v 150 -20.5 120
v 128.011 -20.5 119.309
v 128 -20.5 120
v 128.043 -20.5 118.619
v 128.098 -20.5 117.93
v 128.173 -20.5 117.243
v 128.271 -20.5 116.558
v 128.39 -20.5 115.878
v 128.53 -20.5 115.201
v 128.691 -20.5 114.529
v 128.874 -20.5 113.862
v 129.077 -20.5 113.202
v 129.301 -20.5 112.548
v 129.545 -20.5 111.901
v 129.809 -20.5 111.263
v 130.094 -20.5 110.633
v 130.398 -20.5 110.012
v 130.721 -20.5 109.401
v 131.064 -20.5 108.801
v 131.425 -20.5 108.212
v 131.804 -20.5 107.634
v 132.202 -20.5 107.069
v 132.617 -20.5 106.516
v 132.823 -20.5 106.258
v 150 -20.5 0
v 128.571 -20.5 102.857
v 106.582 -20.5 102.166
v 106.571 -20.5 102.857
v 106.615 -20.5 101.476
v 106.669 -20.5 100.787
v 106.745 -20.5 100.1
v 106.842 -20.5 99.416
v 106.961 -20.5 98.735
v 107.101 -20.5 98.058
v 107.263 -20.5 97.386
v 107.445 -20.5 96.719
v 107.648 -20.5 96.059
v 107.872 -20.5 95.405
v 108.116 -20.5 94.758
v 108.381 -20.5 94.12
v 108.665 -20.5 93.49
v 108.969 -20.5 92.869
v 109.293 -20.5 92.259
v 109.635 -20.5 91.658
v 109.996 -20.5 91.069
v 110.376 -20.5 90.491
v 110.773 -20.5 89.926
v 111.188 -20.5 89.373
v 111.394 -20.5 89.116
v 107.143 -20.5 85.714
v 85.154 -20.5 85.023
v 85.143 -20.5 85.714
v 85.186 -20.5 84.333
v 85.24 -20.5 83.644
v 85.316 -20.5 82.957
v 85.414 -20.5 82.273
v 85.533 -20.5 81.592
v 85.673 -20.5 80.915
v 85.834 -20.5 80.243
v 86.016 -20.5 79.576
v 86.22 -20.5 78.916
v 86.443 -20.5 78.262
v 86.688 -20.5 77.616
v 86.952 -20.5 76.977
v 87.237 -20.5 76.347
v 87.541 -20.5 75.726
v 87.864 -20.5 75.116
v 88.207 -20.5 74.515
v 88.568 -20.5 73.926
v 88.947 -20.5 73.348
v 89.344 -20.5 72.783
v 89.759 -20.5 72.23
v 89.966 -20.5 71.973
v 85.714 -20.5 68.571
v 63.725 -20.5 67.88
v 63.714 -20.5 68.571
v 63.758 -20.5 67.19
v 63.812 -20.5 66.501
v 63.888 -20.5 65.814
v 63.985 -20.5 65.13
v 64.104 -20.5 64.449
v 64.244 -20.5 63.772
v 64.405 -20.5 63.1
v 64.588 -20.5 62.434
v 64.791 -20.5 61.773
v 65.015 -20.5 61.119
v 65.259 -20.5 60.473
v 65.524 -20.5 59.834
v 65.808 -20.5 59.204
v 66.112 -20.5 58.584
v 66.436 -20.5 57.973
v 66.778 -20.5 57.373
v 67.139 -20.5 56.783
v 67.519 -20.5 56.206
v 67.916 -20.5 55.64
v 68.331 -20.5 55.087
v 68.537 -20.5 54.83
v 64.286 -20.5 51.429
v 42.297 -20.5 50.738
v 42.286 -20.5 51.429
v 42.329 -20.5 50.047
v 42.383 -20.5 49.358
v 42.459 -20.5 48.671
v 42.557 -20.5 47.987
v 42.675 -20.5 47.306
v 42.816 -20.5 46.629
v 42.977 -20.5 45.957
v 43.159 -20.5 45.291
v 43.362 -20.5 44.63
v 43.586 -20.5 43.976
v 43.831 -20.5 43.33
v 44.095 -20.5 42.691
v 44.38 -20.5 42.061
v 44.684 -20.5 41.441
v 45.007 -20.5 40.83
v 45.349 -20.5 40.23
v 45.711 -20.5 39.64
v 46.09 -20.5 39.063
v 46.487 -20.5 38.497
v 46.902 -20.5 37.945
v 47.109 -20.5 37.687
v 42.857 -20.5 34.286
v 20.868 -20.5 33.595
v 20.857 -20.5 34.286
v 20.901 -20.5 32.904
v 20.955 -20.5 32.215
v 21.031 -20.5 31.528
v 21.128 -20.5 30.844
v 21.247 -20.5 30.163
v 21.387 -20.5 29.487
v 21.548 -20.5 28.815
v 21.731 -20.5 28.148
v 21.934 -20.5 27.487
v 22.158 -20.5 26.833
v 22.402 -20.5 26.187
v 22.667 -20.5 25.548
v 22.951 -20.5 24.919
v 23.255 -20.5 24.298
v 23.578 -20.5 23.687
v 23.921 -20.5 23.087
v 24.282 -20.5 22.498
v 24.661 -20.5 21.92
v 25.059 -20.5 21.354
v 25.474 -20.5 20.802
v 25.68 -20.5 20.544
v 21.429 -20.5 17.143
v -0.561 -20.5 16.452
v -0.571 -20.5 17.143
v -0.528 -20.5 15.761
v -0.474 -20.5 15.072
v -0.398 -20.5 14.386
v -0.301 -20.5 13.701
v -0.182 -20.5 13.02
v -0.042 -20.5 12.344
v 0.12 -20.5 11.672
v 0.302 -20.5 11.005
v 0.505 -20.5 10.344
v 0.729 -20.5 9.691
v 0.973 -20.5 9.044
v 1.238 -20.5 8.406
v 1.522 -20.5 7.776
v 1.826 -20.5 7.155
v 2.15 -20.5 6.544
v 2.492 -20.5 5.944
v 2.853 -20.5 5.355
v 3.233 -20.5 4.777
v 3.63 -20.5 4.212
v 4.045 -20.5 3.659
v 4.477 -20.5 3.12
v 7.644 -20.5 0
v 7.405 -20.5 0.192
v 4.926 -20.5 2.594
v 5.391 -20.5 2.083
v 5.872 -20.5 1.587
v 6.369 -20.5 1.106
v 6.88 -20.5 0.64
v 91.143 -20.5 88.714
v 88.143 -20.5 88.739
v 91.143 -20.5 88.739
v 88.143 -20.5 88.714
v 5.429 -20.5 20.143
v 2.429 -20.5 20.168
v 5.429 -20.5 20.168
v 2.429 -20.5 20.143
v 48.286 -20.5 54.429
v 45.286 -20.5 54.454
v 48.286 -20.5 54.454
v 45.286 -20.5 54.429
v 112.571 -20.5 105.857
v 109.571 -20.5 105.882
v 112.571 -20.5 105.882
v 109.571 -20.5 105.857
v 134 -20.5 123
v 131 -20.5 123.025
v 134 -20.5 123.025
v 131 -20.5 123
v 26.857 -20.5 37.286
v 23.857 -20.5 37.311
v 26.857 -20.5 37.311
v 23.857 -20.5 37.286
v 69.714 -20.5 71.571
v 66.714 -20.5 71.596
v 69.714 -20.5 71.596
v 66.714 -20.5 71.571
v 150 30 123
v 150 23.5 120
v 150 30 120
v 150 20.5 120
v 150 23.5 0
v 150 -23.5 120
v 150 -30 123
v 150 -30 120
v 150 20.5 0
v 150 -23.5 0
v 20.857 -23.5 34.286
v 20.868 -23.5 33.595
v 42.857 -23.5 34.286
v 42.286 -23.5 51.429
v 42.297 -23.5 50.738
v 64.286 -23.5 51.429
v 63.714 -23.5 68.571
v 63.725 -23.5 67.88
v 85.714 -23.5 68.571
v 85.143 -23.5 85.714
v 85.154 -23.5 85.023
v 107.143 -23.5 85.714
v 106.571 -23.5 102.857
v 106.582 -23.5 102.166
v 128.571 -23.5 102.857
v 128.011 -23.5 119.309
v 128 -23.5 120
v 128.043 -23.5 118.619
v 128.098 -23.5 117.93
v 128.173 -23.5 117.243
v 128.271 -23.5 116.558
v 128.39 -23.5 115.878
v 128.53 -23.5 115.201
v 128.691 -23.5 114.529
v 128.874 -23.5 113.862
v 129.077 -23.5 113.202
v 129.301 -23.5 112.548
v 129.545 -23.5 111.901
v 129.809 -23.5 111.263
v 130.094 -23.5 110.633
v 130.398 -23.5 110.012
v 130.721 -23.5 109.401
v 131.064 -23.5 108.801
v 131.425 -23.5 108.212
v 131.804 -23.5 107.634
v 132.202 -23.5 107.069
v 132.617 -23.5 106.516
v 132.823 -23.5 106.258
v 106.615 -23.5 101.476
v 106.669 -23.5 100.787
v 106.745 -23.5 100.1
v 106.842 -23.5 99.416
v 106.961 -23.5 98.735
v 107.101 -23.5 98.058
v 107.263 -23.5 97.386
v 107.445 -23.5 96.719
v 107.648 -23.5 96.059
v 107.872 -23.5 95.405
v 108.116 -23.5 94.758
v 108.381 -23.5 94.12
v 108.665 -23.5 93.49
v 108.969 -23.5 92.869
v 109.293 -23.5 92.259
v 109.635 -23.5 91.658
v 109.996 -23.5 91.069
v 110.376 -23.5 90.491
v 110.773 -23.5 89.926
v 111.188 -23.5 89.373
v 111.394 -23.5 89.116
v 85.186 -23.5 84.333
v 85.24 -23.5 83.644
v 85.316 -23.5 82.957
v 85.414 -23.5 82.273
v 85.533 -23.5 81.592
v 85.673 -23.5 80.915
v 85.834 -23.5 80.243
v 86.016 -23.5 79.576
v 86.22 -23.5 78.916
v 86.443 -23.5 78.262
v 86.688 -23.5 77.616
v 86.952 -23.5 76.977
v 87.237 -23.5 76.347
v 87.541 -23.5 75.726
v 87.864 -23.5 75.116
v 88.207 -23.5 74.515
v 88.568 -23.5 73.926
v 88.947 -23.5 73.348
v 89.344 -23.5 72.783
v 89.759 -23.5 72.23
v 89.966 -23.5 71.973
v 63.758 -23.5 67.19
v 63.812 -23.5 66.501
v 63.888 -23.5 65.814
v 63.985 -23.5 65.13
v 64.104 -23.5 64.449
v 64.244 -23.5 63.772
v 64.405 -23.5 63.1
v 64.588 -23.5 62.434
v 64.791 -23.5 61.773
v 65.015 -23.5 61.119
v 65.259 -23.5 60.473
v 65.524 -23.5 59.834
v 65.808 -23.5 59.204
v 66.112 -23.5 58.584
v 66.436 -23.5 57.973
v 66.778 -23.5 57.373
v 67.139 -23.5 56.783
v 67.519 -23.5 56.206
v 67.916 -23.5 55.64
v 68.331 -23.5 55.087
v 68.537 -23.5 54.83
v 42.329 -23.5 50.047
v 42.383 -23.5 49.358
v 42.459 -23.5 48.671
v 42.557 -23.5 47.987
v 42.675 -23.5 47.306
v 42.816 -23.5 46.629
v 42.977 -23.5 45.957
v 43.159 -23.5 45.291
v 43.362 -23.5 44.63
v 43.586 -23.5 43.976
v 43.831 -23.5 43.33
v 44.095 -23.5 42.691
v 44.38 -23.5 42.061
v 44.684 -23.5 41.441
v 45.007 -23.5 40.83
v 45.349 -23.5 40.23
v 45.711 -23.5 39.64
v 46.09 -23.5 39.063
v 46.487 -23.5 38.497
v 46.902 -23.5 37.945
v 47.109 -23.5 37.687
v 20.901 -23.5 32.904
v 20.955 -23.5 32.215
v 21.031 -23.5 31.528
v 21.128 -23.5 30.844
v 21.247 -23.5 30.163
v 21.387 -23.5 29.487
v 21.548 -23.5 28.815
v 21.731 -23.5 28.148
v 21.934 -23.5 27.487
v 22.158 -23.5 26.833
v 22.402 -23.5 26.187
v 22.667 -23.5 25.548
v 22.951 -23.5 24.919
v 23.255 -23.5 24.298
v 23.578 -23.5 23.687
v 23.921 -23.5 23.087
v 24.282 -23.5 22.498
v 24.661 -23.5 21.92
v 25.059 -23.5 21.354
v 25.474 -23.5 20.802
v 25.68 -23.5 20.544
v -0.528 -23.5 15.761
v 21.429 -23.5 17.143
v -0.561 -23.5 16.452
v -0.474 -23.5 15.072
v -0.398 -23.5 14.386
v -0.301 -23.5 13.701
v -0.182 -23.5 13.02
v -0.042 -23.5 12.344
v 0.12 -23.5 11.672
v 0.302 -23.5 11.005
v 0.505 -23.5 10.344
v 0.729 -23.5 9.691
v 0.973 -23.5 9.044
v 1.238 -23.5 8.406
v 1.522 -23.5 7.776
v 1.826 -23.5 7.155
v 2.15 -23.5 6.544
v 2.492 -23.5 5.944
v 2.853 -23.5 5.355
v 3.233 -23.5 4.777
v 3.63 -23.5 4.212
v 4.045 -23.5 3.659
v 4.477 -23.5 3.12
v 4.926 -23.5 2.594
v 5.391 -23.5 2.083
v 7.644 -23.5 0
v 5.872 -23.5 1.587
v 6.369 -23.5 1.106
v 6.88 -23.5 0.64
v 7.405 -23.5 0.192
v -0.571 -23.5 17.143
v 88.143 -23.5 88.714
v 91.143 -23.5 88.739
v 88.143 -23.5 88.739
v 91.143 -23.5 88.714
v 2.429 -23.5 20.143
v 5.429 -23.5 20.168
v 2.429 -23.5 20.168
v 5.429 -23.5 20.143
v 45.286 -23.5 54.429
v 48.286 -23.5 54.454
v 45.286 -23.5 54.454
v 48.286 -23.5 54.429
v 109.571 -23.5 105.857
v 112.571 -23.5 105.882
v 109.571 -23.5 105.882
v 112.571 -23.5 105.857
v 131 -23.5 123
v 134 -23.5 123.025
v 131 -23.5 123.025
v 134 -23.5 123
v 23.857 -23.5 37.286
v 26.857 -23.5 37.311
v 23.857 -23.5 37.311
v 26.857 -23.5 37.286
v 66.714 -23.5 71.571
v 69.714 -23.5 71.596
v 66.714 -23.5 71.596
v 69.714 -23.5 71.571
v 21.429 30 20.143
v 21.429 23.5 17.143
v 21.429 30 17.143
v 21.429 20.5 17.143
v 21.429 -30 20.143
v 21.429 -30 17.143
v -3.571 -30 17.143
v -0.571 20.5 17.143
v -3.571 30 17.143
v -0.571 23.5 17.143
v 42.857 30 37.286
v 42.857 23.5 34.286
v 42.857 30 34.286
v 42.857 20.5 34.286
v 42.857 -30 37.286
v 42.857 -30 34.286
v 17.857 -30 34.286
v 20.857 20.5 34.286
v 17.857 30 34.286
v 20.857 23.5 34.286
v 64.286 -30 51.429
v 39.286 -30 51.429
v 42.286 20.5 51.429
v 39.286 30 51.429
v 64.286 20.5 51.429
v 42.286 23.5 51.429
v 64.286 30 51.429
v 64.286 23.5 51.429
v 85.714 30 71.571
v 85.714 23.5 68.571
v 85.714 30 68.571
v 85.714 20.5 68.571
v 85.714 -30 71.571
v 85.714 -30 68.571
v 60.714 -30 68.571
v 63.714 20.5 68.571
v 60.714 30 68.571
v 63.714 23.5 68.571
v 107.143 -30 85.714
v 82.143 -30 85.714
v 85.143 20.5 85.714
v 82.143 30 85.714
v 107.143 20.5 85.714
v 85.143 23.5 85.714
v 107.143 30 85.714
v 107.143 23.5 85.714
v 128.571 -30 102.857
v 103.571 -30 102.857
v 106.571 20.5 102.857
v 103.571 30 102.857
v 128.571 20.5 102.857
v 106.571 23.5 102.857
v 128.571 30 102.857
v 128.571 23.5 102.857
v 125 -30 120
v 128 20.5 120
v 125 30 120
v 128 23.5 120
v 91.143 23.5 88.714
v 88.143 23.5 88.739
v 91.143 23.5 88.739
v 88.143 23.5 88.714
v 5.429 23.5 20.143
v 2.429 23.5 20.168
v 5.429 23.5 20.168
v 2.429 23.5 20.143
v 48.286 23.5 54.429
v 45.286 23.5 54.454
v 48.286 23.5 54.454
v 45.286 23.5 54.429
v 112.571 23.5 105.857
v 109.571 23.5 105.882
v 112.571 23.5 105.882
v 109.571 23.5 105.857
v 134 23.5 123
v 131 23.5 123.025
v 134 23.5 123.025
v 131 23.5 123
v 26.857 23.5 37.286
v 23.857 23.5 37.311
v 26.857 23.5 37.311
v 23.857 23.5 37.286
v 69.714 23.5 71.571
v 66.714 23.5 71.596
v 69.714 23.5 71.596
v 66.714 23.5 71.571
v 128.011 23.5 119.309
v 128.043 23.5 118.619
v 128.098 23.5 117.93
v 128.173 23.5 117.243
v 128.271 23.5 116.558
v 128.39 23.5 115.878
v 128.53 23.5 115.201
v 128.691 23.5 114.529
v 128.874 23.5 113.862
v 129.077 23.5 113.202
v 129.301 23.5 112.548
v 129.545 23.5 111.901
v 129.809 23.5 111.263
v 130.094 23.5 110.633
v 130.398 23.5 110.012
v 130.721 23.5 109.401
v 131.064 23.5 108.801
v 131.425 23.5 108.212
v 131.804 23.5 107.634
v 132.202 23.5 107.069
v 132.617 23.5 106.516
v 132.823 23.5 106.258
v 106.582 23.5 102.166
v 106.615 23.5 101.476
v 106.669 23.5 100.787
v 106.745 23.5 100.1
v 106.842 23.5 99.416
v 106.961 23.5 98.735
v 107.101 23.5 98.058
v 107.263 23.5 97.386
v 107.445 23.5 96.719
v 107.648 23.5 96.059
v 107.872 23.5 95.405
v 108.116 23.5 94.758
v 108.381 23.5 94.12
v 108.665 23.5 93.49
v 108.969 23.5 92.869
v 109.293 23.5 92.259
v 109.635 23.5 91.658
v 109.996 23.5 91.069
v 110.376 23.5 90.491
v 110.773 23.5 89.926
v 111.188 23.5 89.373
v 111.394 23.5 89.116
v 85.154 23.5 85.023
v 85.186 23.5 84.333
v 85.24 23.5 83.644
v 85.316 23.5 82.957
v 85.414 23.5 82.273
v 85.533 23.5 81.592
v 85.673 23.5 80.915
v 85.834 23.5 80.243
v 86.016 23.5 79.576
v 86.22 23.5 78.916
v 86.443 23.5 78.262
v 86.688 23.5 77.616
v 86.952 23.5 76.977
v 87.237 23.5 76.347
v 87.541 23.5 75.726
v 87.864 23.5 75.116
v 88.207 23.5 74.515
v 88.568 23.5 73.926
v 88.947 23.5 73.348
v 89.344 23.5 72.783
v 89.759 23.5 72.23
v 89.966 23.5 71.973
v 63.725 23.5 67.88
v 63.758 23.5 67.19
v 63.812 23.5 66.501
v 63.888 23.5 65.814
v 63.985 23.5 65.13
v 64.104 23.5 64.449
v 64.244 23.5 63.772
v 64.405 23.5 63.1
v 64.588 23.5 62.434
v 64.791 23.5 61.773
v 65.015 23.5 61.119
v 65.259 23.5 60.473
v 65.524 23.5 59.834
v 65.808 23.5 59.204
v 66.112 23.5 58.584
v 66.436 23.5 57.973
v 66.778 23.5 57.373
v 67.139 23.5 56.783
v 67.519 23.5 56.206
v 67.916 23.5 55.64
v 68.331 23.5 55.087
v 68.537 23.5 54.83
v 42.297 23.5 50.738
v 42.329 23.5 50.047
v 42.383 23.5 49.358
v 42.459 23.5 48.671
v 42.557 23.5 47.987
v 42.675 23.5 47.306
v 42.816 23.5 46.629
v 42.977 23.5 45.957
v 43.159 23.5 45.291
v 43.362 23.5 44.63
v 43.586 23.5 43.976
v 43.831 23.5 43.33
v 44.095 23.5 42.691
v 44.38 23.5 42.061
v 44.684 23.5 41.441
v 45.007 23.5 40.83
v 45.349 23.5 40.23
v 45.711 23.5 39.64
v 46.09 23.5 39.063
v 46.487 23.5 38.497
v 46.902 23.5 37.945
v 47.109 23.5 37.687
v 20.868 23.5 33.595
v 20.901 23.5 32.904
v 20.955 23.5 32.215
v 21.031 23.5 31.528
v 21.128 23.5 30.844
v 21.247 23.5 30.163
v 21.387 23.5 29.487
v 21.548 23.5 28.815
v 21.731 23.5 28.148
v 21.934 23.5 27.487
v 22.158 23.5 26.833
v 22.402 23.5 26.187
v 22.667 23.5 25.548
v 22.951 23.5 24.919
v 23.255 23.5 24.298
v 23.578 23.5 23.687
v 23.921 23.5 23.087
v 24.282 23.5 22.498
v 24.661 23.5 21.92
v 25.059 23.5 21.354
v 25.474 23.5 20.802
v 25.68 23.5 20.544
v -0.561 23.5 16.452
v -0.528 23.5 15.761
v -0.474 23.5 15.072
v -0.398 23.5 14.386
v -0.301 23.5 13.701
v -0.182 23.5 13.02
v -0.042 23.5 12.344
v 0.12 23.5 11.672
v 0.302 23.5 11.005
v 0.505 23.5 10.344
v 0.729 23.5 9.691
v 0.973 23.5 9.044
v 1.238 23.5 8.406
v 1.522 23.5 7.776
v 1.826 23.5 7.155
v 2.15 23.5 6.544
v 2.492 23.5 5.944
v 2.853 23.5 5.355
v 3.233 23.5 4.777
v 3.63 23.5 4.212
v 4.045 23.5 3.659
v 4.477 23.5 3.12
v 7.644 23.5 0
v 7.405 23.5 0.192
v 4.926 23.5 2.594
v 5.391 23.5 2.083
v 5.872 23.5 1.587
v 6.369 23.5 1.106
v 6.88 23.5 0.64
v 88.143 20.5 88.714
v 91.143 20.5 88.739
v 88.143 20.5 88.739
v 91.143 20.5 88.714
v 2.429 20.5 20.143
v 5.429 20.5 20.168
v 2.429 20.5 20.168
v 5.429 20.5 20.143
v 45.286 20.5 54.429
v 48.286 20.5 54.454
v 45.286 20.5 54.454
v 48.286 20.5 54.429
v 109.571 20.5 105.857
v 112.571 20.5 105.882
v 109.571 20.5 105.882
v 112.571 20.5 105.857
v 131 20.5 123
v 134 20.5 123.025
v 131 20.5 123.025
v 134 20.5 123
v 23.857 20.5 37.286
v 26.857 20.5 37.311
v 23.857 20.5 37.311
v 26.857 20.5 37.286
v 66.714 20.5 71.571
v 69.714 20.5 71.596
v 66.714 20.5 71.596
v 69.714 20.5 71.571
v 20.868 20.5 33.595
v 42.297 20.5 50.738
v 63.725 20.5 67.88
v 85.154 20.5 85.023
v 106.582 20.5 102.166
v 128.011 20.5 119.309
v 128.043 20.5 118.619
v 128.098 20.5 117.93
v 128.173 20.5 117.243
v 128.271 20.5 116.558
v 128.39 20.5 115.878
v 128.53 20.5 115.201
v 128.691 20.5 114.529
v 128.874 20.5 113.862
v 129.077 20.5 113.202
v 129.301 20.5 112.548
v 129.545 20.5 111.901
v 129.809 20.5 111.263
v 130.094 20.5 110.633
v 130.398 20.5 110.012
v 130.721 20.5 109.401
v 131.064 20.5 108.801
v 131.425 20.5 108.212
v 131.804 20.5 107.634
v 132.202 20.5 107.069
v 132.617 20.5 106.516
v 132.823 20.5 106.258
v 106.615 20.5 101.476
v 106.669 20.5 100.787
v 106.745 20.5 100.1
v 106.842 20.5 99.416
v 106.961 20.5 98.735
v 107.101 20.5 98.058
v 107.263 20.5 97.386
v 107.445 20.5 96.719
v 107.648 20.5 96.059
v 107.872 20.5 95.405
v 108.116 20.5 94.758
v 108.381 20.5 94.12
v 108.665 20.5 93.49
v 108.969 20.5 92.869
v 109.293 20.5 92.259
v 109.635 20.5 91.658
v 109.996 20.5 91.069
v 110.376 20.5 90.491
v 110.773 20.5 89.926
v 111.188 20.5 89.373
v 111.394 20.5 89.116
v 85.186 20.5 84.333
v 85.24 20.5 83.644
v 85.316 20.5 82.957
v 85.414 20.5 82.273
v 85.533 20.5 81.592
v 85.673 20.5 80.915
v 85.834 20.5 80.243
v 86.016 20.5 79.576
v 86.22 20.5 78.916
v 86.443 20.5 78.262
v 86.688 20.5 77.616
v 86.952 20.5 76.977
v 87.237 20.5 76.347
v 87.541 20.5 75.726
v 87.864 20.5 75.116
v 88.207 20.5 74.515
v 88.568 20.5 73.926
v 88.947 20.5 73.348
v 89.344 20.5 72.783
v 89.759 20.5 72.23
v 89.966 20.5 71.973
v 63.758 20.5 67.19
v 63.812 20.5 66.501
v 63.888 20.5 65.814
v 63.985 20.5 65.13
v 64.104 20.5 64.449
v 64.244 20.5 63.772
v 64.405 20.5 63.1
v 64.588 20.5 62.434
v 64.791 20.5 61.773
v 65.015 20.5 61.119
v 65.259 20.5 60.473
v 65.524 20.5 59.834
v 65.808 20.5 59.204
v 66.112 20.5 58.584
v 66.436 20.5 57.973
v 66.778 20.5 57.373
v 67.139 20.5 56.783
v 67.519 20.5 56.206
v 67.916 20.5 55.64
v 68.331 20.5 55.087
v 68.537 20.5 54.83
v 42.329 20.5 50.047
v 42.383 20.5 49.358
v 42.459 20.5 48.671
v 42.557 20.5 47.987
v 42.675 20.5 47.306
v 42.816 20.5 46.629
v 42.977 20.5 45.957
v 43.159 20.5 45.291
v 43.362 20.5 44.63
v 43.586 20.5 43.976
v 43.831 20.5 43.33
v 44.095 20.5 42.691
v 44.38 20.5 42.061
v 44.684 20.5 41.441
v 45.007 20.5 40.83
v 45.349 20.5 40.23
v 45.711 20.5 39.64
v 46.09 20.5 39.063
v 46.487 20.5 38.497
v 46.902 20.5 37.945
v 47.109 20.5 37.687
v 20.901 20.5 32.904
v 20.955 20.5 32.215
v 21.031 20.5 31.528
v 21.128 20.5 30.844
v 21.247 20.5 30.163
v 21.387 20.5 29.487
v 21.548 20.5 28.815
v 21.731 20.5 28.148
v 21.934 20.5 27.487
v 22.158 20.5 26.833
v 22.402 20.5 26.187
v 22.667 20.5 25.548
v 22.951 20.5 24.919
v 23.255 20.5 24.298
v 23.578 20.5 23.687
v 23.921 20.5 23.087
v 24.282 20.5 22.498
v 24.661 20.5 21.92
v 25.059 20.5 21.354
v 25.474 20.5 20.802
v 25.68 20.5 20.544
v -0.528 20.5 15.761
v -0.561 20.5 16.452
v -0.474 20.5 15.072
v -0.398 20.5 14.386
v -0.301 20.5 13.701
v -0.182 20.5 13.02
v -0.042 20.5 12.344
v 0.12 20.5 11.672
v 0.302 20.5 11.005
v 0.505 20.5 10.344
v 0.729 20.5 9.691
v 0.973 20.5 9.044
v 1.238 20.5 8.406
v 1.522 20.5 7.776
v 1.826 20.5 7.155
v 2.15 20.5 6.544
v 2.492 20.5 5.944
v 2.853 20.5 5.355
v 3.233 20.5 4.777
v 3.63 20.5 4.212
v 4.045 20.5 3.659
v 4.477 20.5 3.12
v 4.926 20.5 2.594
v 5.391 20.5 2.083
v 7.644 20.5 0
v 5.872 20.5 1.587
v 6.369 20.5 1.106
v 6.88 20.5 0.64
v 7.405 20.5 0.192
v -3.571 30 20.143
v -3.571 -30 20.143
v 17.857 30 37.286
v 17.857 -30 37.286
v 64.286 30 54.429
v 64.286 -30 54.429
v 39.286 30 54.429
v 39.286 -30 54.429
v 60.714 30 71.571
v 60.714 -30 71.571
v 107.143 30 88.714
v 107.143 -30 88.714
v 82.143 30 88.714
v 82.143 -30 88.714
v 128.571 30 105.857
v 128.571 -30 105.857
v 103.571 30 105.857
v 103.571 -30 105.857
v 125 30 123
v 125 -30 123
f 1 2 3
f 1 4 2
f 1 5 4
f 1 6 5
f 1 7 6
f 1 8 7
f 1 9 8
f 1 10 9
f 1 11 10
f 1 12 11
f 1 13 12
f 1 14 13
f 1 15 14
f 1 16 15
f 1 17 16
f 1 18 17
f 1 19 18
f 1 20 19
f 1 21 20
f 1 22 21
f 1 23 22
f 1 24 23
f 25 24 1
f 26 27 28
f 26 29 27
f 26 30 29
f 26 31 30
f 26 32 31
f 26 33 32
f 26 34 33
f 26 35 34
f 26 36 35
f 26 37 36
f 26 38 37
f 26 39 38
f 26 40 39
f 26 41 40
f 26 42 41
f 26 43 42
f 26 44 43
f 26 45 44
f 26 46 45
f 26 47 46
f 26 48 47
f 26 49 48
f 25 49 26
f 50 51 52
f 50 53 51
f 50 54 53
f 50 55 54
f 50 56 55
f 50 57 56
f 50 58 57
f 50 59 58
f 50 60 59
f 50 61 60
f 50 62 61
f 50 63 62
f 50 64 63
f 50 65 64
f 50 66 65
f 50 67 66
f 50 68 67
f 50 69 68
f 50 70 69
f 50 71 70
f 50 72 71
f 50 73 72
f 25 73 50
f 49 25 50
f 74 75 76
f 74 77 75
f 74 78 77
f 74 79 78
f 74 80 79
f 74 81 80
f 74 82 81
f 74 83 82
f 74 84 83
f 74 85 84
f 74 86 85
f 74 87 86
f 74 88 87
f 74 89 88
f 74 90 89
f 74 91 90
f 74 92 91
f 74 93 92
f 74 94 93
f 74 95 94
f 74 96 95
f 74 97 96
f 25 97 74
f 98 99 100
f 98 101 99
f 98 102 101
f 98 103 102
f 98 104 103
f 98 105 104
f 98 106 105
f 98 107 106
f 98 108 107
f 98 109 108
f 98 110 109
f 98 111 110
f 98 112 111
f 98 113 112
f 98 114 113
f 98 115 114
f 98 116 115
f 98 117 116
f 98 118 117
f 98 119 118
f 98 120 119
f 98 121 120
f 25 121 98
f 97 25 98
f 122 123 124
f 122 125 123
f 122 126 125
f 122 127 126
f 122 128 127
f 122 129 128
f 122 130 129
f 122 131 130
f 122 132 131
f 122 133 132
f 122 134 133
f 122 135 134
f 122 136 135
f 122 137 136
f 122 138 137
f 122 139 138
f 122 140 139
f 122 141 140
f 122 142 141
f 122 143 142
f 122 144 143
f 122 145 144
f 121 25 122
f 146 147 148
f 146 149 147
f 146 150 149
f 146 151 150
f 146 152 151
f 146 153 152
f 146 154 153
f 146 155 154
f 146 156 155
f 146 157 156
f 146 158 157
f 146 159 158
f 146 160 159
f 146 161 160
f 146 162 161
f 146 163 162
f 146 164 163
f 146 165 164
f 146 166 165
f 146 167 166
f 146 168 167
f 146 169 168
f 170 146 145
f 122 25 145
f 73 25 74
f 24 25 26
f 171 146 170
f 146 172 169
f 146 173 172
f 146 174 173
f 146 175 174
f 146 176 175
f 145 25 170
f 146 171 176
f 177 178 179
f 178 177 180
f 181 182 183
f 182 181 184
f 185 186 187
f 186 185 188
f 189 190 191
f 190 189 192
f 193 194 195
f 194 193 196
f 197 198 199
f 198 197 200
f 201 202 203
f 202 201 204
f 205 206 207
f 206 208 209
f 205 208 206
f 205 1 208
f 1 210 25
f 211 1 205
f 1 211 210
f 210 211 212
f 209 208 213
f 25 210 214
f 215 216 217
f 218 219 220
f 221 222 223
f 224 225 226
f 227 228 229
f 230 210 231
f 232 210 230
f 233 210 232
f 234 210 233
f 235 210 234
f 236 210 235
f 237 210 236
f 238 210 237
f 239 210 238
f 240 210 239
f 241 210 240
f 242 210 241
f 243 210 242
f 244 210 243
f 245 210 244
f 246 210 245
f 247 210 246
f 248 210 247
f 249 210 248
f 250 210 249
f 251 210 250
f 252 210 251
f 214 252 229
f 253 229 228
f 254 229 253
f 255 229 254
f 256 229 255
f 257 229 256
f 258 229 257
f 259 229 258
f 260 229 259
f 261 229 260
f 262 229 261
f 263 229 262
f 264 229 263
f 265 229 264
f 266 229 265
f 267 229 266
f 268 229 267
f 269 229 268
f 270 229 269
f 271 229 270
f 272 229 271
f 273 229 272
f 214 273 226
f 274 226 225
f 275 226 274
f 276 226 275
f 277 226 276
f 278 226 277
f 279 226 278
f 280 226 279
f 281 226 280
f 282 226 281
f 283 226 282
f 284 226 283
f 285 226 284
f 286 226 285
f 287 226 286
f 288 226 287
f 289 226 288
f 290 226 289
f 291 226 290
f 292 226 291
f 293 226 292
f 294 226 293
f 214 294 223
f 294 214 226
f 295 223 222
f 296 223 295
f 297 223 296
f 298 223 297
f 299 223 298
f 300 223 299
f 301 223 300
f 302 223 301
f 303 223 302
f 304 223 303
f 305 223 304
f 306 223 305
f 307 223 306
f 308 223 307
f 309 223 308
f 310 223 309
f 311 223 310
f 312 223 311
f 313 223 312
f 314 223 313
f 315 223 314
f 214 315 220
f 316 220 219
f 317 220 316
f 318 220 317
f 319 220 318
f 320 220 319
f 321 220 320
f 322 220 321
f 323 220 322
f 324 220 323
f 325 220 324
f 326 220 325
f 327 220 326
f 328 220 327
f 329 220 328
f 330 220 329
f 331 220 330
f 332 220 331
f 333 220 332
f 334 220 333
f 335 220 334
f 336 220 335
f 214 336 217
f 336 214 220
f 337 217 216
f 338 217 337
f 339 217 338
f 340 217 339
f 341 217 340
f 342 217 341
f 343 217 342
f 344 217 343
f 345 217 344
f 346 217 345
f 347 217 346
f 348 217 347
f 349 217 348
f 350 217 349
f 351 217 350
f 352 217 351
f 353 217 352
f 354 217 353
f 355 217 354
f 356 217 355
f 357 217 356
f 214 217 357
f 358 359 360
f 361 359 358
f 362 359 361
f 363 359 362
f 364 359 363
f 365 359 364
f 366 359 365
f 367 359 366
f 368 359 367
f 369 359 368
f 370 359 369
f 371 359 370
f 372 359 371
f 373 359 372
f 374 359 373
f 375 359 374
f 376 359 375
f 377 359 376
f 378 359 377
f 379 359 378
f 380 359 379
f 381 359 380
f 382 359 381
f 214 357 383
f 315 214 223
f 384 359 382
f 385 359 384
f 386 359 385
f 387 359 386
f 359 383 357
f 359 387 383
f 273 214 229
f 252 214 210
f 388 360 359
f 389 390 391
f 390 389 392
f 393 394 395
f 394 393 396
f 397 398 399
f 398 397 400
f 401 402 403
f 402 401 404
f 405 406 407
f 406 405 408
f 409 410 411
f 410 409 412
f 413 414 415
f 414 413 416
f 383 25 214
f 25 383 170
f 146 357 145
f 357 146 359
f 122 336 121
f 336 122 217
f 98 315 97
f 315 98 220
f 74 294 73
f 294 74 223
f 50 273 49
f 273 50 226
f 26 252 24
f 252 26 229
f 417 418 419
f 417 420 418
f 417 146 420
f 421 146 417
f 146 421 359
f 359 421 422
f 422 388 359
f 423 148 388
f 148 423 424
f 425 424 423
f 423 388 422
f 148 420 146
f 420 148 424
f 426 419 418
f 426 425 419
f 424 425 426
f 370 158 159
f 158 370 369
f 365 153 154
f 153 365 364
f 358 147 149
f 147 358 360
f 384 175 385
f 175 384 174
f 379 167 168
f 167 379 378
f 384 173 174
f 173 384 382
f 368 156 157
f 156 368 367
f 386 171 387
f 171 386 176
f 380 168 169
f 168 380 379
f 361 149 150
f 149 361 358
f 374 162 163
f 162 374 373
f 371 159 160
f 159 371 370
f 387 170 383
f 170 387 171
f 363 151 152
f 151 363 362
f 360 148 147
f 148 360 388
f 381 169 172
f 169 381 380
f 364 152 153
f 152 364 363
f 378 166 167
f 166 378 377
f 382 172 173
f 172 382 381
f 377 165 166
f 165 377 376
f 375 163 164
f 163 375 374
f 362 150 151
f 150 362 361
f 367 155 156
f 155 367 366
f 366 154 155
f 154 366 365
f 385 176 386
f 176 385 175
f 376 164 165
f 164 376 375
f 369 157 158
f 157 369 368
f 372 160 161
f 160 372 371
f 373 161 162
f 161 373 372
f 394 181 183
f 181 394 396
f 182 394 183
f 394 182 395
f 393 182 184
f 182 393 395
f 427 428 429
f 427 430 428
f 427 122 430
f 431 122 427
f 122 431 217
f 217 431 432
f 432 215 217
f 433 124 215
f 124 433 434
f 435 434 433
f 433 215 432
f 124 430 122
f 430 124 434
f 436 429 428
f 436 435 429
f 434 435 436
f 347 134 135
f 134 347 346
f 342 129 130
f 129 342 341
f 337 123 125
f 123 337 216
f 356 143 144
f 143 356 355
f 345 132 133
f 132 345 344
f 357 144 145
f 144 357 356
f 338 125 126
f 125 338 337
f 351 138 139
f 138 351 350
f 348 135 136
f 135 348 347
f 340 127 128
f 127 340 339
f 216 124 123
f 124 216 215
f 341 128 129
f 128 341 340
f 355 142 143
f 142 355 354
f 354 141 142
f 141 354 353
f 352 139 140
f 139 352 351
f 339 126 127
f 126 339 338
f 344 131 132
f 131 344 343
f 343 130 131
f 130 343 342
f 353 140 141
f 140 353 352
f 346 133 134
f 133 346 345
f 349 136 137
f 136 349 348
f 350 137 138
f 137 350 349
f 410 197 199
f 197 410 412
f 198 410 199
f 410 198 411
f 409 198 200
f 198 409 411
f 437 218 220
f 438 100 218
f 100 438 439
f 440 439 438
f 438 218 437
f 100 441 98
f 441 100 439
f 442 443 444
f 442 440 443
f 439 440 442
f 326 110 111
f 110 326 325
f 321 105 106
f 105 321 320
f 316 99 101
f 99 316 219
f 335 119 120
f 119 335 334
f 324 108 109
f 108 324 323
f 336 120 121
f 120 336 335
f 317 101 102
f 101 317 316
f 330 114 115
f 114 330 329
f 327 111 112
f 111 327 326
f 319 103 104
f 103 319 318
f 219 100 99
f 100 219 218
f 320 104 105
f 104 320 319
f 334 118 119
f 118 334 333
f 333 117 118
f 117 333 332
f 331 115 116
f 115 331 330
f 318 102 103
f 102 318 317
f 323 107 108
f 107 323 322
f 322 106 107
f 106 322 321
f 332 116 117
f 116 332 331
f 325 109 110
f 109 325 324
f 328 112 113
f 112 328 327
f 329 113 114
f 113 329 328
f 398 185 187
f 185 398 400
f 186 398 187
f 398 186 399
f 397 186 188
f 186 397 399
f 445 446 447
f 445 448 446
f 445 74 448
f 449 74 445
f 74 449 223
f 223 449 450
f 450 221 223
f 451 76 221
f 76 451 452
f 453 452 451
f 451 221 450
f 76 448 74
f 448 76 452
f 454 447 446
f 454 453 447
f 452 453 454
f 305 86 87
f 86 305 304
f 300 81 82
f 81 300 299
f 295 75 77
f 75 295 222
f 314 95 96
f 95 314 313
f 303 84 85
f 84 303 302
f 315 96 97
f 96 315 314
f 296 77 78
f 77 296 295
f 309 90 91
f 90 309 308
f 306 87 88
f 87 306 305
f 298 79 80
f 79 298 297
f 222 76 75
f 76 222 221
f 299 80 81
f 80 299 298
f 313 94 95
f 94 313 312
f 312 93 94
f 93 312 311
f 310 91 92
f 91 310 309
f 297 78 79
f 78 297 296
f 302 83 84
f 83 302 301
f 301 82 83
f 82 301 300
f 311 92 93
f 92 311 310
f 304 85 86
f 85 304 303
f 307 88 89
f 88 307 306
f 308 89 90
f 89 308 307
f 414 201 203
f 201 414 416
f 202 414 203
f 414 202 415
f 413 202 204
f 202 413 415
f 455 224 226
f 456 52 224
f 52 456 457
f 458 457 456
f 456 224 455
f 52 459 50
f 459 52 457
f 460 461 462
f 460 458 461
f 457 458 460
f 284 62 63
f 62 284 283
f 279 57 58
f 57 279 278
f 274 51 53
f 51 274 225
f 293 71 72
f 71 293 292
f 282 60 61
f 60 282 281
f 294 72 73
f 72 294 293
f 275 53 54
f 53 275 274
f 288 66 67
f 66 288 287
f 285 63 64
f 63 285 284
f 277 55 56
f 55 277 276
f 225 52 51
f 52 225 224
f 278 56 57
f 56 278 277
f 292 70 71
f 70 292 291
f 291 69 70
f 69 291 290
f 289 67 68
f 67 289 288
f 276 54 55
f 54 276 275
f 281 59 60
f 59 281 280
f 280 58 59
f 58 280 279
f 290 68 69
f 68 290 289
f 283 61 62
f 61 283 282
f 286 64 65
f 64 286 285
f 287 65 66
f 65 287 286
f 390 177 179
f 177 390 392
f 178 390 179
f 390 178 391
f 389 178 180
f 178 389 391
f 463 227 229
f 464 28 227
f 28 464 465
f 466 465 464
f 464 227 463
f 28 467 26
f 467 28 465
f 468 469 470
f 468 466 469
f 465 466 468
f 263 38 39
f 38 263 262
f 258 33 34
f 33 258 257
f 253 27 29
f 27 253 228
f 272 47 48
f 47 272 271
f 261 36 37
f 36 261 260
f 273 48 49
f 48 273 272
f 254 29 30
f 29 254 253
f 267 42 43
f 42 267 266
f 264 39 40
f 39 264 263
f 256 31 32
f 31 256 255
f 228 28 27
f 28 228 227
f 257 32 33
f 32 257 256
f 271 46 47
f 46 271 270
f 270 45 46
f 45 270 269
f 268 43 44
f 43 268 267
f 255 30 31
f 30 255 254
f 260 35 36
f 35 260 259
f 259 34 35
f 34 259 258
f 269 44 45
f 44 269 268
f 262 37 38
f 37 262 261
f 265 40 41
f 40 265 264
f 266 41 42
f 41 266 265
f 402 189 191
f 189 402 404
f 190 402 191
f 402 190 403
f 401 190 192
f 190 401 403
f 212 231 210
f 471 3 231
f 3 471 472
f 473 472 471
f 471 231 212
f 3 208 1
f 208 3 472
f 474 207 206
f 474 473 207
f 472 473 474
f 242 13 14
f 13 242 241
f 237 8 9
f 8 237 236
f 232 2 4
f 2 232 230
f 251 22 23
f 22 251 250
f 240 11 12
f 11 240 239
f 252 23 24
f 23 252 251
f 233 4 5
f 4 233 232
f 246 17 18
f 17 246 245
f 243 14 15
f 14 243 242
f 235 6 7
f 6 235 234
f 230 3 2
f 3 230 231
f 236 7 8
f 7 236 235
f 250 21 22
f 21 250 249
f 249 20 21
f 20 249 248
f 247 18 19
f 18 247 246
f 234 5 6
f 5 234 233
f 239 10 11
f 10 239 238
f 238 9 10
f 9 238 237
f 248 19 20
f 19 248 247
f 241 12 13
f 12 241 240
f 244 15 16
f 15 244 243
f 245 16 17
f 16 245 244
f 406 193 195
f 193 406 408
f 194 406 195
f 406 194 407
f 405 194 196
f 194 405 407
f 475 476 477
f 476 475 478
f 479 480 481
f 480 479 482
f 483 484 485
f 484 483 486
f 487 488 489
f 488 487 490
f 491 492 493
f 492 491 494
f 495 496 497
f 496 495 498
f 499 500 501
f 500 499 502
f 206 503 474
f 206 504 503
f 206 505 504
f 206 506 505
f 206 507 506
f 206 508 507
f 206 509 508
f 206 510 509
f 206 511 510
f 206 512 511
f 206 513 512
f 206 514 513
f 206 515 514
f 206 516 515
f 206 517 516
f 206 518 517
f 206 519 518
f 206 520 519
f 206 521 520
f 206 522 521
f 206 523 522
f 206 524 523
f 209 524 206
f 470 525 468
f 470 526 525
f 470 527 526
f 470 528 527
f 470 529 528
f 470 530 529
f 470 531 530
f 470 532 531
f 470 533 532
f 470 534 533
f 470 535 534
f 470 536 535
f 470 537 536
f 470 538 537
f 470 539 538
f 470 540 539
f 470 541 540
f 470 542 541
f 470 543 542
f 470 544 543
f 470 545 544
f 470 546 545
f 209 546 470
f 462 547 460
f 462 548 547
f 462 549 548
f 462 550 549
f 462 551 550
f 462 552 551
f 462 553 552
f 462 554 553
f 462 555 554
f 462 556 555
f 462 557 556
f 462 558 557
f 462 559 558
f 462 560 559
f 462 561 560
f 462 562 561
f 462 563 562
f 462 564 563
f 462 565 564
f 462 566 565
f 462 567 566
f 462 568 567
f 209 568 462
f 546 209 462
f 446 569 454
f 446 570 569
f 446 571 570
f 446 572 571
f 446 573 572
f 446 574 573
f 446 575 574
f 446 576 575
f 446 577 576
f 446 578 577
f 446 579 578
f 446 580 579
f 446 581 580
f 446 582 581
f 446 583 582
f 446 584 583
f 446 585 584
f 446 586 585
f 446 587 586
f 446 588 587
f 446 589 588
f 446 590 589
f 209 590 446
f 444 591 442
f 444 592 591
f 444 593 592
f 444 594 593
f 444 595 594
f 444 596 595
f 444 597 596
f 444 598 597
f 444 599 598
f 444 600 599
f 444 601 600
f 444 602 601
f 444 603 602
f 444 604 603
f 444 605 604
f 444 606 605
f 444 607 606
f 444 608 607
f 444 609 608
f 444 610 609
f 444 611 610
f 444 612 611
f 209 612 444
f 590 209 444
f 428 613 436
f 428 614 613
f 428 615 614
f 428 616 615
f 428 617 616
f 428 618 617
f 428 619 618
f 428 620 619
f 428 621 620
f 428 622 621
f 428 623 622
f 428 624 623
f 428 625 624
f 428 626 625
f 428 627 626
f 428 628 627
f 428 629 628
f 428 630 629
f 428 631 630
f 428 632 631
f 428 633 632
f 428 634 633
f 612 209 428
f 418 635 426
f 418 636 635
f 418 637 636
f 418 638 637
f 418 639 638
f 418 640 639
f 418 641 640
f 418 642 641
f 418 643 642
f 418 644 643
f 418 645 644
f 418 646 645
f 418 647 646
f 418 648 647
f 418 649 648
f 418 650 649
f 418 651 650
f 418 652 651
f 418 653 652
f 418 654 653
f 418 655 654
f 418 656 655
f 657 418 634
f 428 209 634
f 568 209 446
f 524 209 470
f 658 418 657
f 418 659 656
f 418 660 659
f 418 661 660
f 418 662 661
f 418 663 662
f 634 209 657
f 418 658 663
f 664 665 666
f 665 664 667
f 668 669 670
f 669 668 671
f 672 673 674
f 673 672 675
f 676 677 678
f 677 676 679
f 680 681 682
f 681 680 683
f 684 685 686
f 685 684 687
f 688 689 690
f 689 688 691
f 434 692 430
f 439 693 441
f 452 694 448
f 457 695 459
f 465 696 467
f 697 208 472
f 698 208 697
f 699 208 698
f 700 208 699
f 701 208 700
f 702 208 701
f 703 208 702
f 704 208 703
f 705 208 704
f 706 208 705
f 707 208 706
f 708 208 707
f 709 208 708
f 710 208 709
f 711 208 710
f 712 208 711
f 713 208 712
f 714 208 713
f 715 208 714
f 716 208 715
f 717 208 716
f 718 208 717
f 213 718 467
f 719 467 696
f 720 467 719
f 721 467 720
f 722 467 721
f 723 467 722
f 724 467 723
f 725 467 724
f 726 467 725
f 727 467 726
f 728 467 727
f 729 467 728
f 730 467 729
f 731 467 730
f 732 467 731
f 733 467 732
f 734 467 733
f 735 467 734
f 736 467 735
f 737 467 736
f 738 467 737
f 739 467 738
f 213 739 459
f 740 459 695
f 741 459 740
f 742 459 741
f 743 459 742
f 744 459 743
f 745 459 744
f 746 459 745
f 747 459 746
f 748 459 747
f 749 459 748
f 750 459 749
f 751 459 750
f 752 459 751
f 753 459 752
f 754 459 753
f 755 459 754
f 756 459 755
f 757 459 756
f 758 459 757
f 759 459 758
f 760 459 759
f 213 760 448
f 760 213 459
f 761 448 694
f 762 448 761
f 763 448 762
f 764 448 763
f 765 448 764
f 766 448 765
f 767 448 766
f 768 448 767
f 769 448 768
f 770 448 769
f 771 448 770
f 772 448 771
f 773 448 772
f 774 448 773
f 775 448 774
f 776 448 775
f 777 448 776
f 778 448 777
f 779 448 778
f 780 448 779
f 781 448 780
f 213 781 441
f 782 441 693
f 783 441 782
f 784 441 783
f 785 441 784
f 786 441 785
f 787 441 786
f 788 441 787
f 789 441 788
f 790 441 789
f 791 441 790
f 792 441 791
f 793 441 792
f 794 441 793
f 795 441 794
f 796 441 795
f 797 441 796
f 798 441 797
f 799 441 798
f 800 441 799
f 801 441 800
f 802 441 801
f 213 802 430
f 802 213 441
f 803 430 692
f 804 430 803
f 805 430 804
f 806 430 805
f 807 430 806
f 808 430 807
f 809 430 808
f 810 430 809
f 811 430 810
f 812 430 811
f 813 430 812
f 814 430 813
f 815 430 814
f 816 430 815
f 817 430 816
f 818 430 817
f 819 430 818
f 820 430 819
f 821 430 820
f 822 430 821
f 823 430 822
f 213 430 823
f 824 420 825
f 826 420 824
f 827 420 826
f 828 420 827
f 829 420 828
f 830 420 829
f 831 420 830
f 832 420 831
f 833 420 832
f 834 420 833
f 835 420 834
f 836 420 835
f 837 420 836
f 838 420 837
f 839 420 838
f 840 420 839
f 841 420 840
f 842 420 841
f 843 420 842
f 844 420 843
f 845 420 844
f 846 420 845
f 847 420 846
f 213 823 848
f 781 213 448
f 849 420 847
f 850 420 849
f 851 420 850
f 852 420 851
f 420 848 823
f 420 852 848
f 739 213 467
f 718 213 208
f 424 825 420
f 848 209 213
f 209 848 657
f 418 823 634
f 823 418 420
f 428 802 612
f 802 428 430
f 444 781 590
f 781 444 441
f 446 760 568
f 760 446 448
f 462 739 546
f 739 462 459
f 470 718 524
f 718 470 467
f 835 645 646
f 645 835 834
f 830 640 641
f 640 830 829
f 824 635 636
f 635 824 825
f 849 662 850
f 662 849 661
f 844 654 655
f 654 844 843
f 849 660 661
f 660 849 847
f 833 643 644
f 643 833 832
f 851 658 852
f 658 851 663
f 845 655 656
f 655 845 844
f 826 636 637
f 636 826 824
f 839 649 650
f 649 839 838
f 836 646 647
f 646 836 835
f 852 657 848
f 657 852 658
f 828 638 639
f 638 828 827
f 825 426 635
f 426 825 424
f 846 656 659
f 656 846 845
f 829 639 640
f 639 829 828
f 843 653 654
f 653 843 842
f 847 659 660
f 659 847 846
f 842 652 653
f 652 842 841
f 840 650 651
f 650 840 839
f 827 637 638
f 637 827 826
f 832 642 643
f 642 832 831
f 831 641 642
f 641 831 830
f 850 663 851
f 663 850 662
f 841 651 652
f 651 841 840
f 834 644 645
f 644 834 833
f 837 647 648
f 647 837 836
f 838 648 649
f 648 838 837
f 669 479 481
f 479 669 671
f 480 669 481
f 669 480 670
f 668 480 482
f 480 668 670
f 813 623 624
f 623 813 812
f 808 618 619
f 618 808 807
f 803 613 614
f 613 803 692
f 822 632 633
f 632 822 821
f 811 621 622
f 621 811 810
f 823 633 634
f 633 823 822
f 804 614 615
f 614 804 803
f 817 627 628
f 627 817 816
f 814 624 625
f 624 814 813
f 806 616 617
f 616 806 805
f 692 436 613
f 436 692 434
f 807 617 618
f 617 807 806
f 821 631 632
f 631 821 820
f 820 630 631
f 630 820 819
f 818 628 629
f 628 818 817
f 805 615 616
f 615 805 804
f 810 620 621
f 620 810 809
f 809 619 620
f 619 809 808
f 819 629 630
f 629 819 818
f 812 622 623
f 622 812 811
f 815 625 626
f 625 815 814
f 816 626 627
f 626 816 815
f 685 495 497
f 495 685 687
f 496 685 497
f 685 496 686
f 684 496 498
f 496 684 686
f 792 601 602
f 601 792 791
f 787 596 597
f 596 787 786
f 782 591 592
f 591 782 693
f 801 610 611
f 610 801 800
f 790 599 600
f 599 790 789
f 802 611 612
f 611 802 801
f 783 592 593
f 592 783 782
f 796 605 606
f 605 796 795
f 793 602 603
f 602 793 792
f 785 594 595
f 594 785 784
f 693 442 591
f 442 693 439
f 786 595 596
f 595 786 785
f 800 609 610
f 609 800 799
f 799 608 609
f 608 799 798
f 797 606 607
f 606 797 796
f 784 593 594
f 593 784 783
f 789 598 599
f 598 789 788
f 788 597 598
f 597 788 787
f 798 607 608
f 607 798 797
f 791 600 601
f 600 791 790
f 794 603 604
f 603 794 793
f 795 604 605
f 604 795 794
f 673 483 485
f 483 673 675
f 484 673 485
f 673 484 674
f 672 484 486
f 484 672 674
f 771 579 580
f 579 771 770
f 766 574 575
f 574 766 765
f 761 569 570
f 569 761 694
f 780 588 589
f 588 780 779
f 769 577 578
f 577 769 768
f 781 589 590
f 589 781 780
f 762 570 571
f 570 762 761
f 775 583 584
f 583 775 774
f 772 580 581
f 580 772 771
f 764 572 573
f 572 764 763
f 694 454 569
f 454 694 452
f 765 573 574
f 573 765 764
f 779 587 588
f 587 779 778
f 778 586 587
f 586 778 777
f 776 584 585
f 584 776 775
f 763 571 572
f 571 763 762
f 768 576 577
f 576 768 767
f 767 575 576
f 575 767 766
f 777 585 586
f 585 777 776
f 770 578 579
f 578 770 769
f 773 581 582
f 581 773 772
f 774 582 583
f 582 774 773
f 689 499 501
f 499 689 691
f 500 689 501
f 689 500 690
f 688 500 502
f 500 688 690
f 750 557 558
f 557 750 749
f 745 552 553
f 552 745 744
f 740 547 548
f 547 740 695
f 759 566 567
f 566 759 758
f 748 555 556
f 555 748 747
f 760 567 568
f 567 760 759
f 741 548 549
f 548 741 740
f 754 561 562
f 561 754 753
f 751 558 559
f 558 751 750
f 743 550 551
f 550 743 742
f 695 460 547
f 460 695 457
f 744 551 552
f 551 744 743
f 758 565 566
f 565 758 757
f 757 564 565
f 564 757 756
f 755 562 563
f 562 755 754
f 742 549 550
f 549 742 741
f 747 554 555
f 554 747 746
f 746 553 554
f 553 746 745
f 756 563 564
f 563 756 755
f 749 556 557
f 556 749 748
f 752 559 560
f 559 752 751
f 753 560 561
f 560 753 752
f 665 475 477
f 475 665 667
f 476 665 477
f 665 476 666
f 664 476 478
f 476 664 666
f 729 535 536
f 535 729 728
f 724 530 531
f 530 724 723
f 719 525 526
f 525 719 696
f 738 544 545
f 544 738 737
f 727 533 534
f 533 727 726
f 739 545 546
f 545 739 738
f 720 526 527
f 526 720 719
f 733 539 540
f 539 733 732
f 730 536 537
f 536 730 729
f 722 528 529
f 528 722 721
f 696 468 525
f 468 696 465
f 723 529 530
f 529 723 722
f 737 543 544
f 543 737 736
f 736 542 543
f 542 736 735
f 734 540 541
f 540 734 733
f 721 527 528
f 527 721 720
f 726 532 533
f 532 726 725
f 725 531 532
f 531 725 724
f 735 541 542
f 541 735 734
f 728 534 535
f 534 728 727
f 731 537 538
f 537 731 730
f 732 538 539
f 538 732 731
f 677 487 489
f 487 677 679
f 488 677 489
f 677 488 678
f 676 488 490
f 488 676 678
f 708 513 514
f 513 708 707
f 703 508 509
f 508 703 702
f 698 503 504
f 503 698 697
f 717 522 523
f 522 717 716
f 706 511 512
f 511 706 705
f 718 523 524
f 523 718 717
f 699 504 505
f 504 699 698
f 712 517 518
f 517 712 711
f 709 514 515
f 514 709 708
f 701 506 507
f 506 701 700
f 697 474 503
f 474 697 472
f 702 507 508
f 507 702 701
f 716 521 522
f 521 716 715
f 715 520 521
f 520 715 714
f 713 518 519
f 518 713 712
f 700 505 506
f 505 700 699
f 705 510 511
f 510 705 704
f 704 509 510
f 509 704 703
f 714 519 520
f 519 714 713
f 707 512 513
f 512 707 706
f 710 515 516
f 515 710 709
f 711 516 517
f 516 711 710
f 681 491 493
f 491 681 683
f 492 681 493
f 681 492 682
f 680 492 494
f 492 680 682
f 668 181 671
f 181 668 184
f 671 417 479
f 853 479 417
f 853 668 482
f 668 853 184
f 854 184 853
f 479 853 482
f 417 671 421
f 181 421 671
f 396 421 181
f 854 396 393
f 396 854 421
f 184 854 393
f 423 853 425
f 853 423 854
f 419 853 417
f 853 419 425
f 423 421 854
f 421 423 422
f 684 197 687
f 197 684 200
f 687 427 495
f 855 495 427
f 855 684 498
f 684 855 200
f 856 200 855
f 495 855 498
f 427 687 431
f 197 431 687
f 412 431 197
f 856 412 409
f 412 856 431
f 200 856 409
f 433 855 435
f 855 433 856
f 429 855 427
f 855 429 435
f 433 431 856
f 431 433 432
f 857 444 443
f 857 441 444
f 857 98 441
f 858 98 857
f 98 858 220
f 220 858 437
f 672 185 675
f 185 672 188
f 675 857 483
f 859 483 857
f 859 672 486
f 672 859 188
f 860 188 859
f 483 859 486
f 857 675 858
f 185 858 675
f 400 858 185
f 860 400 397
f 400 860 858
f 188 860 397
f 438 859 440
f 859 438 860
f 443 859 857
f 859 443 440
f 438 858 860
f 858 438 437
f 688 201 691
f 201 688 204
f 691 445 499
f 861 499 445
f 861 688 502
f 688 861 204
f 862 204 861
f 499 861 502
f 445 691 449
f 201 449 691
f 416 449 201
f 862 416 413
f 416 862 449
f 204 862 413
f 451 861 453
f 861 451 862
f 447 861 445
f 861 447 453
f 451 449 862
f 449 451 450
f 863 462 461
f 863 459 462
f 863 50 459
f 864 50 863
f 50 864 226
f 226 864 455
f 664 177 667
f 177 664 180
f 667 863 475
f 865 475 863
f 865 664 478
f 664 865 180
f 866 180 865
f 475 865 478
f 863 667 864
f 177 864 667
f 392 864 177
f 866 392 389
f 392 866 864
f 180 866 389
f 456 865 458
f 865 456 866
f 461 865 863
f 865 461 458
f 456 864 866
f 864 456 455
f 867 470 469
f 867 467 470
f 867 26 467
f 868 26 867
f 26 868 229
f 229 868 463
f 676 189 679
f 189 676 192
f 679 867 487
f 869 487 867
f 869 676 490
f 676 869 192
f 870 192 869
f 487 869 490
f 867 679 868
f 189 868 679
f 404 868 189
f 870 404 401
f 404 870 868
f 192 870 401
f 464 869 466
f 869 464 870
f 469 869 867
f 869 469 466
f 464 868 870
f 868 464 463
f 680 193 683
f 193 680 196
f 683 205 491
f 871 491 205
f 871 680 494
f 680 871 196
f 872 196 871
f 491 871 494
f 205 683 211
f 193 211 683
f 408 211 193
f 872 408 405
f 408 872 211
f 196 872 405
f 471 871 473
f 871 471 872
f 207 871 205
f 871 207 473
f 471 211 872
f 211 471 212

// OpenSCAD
// file: step.scad
include <config.scad>;

module step_positive()
{
    color(step_color)
    translate([
        -step_x/2,
        0,
        material_z/2
        ])
    cube([
        step_x,
        step_y,
        material_z
        ], center=true);
}

module step()
{
    difference()
    {
        step_positive();

        // right side nose cutout
        translate([
            -step_support_radius + material_z*3/2,,
            -step_y/2 + stairs_support_inset,
            material_z/2
            ])
        cube([
            material_z,
            material_z,
            material_z*1.2
            ], center=true);

        // left side nose cutout
        translate([
            -step_support_radius + material_z*3/2,,
            +step_y/2 - stairs_support_inset,
            material_z/2
            ])
        cube([
            material_z,
            material_z,
            material_z*1.2
            ], center=true);
    }
}

module step_support_cylinder()
{
    intersection()
    {
        // lower left quadrant of the xz-plane
        translate([
            -stairs_x/2,
            0,
            -stairs_z/2
            ])
        cube([
            stairs_x,
            material_z,
            stairs_z
            ], center=true);

        // cylinder
        rotate([
            90,
            0,
            0
            ])
        cylinder(
            r=step_support_radius,
            h=material_z,
            center=true
            );
    }
}

module step_support()
{
    color(support_color)
    {
        step_support_cylinder();

        // nose
        translate([
            -step_support_radius + material_z*3/2,
            0,
            material_z/2
            ])
        cube([
            material_z,
            material_z,
            material_z + nothing
            ], center=true);
    }
}

step();

/*
translate([
    0,
    -step_y/2 + stairs_support_inset,
    0
    ])
step_support();
*/
// file: support.scad
include <config.scad>;
use <step.scad>;

module support_triangle()
{
    // rotate into xz-plane
    rotate([
        90,
        0,
        0
        ])
    // make 3d
    linear_extrude(material_z, center=true)
    // triangle
    polygon([
        [0, 0],
        [stairs_x, 0],
        [stairs_x, stairs_z]
        ]);
}

module support_triangle_without_corner()
{
    difference()
    {
        support_triangle();

        translate([
            stairs_x/(step_count*4),
            0,
            stairs_z/2 - nothing
            ])
        cube([
            stairs_x/(2*step_count),
            material_z*1.2,
            stairs_z
            ], center=true);
    }
}

module support_with_step_supports()
{
    // begin with a triangle
    support_triangle_without_corner();

    // add step supports
    for (i=[1:step_count])
    {
        translate([
            i*stairs_x/step_count,
            0,
            i*stairs_z/step_count
            ])
        step_support();
    }
}

module support()
{
    color(support_color)
    intersection()
    {
        support_with_step_supports();

        // upper right quadrant of the xz-plane
        translate([
            0,
            0,
            +stairs_z
            ])
        cube([
            2*stairs_x,
            material_z,
            2*stairs_z
            ], center=true);
    }
}

support();
// file: config.scad
/**
 * All measures in millimeters.
 */

$fn = 200;
nothing = 0.05;

material_z = 3;

stairs_x = 150;
stairs_z = 120;

step_count = 7;
step_x = 25;
step_y = 60;
step_support_radius = step_x - material_z;

stairs_support_inset = 8;

step_color = "brown";
support_color = "yellow";
// main file
include <config.scad>;
use <support.scad>;
use <step.scad>;

module model()
{
    // front support
    translate([
        0,
        -step_y/2 + stairs_support_inset,
        0
        ])
    support();

    // back support
    translate([
        0,
        +step_y/2 - stairs_support_inset,
        0
        ])
    support();

    // the steps
    for (i=[1:step_count])
    {
        translate([
            i*stairs_x/step_count,
            0,
            i*stairs_z/step_count
            ])
        step();
    }
}

model();
